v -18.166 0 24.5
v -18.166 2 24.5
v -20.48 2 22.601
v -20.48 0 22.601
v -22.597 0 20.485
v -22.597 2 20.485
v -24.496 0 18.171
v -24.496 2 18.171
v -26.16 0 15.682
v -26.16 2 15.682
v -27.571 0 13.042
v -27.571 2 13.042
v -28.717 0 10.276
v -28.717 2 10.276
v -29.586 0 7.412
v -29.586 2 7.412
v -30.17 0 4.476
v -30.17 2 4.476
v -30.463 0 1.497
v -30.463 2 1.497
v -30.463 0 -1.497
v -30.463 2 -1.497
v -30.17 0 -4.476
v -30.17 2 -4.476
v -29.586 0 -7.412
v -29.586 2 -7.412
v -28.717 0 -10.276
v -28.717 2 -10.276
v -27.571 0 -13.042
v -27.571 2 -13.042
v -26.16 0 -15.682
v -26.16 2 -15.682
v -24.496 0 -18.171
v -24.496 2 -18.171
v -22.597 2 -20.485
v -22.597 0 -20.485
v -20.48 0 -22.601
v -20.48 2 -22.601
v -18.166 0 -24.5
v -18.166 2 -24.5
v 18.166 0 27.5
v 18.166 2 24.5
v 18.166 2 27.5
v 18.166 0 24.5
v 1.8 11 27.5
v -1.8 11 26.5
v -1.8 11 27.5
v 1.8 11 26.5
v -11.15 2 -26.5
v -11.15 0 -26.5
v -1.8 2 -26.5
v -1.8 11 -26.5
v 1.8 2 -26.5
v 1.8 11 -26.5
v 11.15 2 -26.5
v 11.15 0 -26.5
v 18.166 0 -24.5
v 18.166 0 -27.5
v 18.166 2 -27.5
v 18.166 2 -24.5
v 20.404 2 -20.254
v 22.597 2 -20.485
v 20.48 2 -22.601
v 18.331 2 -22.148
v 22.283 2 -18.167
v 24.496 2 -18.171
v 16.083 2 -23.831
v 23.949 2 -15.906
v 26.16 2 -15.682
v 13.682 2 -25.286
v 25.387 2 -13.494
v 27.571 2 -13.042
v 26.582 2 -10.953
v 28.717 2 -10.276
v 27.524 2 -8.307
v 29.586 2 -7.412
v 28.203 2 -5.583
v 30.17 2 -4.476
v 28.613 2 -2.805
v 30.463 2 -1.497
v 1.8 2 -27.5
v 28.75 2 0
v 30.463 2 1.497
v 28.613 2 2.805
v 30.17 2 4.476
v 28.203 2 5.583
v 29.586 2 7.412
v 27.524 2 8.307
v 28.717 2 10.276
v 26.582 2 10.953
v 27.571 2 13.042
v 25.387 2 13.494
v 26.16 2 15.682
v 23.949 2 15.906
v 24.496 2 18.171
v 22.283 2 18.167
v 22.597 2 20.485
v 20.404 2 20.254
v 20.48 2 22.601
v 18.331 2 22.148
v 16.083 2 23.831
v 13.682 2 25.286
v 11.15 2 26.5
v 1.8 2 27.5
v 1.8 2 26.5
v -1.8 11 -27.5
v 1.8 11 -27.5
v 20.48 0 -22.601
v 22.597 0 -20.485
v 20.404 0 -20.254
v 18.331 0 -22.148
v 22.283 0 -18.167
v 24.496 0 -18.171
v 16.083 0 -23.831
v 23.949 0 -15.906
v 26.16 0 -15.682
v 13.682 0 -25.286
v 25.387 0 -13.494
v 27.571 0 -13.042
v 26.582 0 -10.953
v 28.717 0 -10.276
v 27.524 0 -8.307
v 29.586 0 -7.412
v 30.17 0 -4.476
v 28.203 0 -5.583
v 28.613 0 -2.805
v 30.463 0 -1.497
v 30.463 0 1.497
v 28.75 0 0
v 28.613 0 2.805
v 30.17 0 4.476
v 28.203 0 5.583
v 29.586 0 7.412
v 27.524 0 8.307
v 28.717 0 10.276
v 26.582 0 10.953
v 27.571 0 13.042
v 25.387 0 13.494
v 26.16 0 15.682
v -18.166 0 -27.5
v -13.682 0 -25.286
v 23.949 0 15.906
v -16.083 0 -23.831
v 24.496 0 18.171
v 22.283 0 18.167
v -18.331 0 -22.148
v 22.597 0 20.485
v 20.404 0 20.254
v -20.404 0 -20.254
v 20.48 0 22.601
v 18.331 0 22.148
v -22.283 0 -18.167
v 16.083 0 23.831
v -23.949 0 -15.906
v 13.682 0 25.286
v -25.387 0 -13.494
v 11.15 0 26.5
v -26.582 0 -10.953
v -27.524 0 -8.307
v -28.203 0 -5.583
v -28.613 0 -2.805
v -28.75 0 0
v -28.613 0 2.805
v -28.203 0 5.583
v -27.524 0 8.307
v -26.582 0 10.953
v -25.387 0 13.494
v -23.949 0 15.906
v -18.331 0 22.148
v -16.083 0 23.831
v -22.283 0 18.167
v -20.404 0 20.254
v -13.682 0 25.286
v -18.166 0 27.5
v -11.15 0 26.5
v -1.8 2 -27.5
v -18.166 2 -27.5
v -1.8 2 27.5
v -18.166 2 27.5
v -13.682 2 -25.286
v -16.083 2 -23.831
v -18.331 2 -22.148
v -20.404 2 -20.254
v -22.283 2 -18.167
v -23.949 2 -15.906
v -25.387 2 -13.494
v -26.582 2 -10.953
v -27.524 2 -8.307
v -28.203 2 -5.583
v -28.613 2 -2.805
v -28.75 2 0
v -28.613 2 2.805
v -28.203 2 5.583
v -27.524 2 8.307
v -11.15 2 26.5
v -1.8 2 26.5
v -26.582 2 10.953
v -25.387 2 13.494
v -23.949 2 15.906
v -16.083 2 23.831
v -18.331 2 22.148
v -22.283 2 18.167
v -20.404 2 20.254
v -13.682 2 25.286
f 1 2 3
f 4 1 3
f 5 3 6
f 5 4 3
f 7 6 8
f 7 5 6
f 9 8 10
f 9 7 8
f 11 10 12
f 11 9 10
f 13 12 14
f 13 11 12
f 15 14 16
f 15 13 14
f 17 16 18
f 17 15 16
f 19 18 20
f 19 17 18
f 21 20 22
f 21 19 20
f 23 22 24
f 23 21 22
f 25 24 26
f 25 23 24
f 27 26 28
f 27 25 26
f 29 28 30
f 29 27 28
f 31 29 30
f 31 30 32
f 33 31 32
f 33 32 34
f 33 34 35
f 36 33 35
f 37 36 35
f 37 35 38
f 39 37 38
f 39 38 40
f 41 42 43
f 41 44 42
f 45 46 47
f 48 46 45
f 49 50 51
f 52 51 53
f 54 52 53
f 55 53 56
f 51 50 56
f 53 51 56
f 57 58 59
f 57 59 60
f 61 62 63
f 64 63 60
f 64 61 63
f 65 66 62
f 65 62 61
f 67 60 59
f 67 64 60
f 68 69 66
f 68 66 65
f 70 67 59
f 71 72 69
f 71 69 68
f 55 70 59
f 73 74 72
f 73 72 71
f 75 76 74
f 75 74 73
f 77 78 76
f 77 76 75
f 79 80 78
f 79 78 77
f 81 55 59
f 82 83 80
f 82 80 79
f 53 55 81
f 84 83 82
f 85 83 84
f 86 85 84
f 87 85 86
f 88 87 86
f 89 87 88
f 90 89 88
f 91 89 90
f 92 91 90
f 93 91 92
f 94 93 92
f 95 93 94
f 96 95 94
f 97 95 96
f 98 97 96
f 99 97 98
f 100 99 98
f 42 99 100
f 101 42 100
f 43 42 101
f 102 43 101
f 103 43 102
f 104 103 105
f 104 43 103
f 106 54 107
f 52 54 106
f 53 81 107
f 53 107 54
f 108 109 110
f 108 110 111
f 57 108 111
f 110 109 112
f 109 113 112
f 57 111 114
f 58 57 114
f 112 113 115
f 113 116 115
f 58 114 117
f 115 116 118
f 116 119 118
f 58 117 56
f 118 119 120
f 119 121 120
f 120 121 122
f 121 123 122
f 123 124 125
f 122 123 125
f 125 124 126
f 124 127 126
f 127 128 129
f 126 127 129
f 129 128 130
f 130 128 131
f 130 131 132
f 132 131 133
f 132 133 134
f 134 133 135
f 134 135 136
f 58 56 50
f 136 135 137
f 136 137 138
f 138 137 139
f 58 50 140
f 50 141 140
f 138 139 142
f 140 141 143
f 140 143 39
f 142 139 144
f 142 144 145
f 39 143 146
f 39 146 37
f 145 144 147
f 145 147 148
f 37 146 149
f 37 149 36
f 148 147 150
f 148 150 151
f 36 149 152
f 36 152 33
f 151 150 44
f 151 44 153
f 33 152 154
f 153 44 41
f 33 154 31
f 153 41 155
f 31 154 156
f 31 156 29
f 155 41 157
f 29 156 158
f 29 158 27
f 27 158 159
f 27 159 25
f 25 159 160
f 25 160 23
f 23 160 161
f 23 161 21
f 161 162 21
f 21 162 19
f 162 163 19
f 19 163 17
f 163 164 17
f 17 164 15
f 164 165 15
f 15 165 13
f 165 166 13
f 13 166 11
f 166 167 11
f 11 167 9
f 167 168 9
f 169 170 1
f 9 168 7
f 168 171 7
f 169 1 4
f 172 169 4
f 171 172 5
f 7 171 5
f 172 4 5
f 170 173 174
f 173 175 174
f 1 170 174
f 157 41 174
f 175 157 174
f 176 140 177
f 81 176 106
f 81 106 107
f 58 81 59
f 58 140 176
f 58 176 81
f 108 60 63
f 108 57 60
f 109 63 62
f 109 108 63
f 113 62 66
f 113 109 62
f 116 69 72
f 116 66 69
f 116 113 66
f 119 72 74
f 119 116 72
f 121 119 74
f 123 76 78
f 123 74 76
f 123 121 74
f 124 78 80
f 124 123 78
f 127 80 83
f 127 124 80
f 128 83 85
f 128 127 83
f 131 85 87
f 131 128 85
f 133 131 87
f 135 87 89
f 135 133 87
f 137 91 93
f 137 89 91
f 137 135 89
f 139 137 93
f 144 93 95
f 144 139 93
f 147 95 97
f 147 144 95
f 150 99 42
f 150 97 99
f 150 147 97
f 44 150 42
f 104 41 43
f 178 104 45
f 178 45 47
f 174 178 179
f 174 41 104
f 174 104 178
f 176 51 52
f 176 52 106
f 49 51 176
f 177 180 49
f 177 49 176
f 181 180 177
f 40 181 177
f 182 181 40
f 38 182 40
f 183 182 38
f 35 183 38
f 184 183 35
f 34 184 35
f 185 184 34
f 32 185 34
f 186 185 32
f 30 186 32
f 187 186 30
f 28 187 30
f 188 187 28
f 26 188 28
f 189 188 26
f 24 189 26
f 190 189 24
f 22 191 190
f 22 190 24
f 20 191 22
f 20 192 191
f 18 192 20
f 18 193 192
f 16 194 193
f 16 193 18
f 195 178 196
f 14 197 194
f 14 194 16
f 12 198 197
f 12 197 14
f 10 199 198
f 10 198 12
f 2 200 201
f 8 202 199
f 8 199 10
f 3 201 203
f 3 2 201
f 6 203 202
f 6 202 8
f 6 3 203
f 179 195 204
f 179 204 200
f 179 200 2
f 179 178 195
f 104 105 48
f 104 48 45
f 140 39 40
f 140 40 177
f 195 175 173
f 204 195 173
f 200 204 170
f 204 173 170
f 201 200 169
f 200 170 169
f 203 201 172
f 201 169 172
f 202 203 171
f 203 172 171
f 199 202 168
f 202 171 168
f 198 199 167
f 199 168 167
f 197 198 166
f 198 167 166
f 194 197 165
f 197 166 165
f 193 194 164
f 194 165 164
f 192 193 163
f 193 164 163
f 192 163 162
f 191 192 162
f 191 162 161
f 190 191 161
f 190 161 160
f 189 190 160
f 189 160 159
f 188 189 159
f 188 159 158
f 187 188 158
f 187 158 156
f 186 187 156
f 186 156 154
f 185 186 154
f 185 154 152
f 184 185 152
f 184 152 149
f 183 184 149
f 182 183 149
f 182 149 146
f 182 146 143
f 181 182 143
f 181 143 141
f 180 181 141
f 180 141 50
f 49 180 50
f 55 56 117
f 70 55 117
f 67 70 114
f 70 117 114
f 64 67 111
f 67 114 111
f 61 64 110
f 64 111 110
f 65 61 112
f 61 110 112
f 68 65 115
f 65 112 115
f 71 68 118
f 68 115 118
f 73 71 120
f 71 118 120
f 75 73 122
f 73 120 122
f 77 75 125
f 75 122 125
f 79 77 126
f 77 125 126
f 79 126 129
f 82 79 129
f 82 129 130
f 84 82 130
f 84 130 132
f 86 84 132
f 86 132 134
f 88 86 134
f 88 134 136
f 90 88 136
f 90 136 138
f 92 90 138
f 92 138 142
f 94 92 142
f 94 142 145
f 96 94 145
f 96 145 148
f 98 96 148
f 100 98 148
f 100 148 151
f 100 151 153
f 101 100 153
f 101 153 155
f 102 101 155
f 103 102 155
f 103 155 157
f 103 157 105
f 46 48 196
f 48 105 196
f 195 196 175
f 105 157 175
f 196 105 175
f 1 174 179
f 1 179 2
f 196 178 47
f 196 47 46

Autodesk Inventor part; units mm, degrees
ref_plane "YZ Plane" through (0, 0, 0) normal (1, 0, 0) x (0, 1, 0)
ref_plane "XZ Plane" through (0, 0, 0) normal (0, 1, 0) x (-1, 0, 0)
ref_plane "XY Plane" through (0, 0, 0) normal (0, 0, 1) x (1, 0, 0)
sketch "Sketch1" plane through (0, 0, 0) normal (0, 1, 0) x (-1, 0, 0)
  circle A0 centre (0, 0) radius 30.5
  circle A1 centre (0, 0) radius 28.75
  line L0 (18.166, -27.5) -> (-18.166, -27.5)
  line L1 (-18.166, -27.5) -> (-18.166, 27.5)
  line L2 (-18.166, 27.5) -> (18.166, 27.5)
  line L3 (18.166, 27.5) -> (18.166, -27.5)
  line L4 (18.166, -27.5) -> (-18.166, 27.5) construction
  line L5 (-18.166, -27.5) -> (18.166, 27.5) construction
  line L6 (26.5, -26.5) -> (-26.5, -26.5)
  line L7 (-26.5, -26.5) -> (-26.5, 26.5)
  line L8 (-26.5, 26.5) -> (26.5, 26.5)
  line L9 (26.5, 26.5) -> (26.5, -26.5)
  line L10 (26.5, -26.5) -> (-26.5, 26.5) construction
  line L11 (-26.5, -26.5) -> (26.5, 26.5) construction
  point P0 (11.1496, -26.5)
  point P1 (-11.1496, -26.5)
  point P2 (-11.1496, 26.5)
  point P3 (11.1496, 26.5)
  point P4 (18.166, -24.4999)
  point P5 (18.166, 24.4999)
  point P6 (-18.166, 24.4999)
  point P7 (-18.166, -24.4999)
  dimension "d0" = 61
  dimension "d1" = 1.75
  dimension "d4" = 36.332
  dimension "d5" = 55
  dimension "d6" = 53
  dimension "d7" = 53
extrude "Extrusion1" add sketch "Sketch1" along normal blind 2 contours A0 L9 A1 | L9 A1 L3 A0 | A0 L3 A1 L9 | L3 A1 L8 A0 | A0 L8 L3 | L3 L6 A0 | A0 L6 A1 L3 | L8 A1 L2 A0 | A0 L2 L3 L8 | L6 L3 L0 A0 | A0 L0 A1 L6 | L8 A1 L2 | A1 L0 L6 | L2 A1 L8 A0 | A0 L8 L1 L2 | A1 L1 A0 L8 | L0 L1 L6 A0 | A0 L6 A1 L0 | L6 A0 L1 A1 | A0 L1 L8 | A1 L7 A0 L1 | L6 L1 A0 | L1 A0 L7 A1 | A1 L7 A0
sketch "Sketch2" plane through (0, 2, 0) normal (0, 1, 0) x (1, 0, 0)
  line L0 (-18.166, -27.5) -> (18.166, -27.5) projected
  line L1 (11.1496, -26.5) -> (-11.1496, -26.5) projected
  line L2 (1.8, -27.5) -> (-1.8, -27.5)
  line L3 (-1.8, -27.5) -> (-1.8, -26.5)
  line L4 (-1.8, -26.5) -> (1.8, -26.5)
  line L5 (1.8, -26.5) -> (1.8, -27.5)
  point P0 (0, 0)
  point P1 (0, -26.5)
  point P2 (1.8, -27)
  dimension "d8" = 3.6
  dimension "d9" = 1.8
extrude "Extrusion2" add sketch "Sketch2" along normal blind 9
mirror "Mirror1" about plane through (0, 0, 0) normal (0, 0, 1) of "Extrusion2"
properties part number "cir"
